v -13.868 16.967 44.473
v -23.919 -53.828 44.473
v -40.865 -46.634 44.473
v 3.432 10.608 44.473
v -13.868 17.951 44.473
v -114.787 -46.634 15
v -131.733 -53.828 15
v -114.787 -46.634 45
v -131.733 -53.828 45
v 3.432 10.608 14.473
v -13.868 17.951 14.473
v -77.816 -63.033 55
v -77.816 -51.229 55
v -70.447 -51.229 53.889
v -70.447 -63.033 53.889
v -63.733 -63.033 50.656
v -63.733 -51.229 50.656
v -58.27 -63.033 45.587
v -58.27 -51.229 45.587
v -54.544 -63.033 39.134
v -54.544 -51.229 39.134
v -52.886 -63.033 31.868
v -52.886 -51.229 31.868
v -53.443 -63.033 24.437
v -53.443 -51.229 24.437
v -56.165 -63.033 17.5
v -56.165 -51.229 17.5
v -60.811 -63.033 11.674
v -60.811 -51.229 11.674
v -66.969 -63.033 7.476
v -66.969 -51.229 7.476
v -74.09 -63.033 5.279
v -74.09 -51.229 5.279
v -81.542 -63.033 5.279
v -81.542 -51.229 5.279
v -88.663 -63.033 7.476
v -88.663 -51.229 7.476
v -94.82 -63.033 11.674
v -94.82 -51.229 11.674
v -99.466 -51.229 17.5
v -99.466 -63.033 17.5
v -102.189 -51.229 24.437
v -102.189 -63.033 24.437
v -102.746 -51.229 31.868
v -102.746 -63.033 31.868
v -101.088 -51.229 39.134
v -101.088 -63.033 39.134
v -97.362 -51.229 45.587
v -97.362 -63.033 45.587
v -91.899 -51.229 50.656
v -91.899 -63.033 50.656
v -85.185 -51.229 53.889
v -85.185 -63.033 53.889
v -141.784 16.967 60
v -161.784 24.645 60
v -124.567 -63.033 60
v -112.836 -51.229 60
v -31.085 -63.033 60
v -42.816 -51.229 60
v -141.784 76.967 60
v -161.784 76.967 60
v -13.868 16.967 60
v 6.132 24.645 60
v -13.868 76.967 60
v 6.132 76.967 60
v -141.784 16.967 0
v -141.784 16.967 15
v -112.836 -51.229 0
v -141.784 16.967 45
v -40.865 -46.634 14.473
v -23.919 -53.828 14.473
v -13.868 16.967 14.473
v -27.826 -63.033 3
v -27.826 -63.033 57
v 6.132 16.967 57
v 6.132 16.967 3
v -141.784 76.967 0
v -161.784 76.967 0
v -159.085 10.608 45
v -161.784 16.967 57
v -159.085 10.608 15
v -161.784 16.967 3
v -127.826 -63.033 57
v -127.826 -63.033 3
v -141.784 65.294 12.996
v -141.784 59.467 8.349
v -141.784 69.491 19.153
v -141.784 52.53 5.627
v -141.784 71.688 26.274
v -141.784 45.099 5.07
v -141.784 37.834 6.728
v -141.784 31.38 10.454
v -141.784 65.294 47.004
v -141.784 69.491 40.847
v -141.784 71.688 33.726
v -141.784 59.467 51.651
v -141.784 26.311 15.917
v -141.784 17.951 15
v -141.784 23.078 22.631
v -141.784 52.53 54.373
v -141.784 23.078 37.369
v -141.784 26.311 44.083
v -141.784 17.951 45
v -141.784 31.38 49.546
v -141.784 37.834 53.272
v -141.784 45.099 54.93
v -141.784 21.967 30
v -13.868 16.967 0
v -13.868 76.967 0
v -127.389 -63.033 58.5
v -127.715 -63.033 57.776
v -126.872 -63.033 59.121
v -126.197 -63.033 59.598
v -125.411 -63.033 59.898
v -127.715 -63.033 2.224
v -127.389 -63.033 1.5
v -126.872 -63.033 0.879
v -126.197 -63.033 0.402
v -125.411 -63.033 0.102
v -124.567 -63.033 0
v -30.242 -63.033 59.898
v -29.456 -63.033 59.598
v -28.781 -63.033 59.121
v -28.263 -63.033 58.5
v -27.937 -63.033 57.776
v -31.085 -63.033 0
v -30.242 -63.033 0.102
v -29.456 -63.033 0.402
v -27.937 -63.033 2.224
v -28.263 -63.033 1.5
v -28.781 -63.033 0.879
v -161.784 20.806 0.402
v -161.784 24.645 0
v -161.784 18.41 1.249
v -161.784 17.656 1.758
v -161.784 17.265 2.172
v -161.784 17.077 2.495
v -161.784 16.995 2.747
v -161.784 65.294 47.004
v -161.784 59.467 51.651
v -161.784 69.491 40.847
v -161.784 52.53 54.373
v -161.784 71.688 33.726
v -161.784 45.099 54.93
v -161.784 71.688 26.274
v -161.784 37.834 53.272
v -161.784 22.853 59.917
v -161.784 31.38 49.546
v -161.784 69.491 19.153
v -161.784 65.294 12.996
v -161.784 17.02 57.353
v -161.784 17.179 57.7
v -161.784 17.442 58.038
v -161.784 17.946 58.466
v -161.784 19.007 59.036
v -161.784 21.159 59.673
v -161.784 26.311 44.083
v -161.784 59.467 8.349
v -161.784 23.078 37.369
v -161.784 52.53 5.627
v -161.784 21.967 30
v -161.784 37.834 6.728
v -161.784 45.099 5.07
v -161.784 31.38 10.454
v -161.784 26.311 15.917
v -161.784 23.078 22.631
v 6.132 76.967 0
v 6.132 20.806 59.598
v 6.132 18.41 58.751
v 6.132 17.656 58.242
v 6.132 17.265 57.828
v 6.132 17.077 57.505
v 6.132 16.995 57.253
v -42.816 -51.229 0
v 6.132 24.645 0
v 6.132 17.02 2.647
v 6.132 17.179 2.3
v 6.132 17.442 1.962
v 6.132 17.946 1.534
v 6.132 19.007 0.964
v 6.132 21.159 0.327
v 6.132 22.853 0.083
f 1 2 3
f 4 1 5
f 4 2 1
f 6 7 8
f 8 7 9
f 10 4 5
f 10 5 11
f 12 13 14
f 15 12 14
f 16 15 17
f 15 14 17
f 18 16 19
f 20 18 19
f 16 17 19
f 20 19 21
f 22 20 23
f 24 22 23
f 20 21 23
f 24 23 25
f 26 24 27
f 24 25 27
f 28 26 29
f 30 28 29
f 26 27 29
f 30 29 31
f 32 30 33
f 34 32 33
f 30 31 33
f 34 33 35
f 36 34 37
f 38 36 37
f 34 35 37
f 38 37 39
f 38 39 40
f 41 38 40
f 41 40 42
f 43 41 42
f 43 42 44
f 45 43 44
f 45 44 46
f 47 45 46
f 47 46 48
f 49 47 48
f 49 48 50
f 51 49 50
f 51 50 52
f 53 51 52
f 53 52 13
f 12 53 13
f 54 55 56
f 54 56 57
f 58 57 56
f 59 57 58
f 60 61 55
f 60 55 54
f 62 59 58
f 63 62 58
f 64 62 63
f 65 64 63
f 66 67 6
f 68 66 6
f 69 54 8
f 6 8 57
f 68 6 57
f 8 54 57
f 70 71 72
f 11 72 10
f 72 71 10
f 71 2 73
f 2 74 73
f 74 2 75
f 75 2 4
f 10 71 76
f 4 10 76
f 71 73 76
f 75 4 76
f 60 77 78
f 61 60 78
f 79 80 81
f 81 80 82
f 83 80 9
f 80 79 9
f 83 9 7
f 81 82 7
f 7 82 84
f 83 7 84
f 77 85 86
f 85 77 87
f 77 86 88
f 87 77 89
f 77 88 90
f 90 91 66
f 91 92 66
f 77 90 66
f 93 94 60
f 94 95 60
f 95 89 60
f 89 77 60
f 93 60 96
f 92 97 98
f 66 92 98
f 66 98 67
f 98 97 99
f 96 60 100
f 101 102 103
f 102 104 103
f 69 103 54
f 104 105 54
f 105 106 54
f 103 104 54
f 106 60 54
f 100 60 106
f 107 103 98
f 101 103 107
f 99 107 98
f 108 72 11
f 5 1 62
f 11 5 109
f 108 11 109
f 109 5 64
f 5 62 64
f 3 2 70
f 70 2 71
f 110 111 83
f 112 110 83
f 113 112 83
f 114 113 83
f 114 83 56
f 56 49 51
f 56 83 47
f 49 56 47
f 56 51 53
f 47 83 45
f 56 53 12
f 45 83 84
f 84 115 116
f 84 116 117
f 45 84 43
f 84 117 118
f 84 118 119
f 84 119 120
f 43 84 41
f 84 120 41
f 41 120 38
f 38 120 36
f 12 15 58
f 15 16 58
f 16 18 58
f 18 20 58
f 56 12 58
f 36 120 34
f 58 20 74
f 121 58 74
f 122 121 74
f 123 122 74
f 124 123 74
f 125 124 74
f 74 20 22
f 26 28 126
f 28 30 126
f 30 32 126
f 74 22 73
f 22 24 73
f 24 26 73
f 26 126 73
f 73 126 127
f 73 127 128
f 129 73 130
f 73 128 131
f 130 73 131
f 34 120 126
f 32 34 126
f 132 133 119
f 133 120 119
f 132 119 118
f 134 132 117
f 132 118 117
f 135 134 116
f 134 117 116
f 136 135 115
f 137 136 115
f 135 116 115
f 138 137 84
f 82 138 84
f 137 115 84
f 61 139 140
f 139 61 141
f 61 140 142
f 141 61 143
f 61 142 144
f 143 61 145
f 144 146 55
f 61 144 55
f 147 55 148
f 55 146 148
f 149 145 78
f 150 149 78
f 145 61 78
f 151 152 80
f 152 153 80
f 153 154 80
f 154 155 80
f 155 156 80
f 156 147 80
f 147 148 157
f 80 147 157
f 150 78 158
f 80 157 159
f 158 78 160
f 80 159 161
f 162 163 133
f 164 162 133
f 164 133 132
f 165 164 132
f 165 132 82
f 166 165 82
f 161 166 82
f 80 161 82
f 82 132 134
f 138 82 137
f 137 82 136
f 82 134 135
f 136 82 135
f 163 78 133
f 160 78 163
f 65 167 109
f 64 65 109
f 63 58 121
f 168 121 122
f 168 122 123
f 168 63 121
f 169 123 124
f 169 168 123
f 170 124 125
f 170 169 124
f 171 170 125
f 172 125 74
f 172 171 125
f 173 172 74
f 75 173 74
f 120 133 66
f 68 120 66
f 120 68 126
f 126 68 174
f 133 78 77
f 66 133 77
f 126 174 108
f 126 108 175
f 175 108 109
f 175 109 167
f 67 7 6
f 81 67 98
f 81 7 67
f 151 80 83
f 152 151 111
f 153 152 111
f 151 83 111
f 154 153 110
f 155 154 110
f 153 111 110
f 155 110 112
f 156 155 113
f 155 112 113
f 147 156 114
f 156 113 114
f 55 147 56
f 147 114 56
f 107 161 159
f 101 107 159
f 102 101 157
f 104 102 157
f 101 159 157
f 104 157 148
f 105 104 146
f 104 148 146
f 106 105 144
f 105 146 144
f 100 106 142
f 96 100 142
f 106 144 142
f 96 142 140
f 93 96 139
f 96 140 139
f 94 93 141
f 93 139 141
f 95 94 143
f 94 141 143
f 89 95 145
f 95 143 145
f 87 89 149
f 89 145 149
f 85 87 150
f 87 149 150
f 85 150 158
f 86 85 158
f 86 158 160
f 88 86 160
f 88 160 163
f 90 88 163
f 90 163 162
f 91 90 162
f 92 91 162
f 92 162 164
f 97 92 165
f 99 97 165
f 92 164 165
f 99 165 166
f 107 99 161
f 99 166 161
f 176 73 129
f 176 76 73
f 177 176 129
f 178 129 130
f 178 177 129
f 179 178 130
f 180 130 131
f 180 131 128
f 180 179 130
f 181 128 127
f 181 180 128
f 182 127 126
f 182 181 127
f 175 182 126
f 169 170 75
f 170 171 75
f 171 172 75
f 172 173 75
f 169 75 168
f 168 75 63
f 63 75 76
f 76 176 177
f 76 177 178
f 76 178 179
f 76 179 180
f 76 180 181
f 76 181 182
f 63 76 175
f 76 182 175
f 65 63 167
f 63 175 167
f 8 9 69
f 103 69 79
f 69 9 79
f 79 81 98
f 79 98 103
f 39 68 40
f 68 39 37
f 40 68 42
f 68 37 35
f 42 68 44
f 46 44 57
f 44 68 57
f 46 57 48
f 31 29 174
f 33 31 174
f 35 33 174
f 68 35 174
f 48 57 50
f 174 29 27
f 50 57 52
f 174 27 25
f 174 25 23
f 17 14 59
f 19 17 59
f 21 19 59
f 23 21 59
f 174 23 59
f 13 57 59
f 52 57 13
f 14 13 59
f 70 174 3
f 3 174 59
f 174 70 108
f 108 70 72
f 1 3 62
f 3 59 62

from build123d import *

# Parameters (mm, degrees)
EXTRUDE_2_DEPTH     = 60
CUT_EXTRUDE_2_DEPTH = 189.939286944
SKETCH_7_R          = 25
CUT_EXTRUDE_4_DEPTH = 20
SKETCH_8_R          = 25
CUT_EXTRUDE_5_DEPTH = 20
SKETCH_9_W          = 30
SKETCH_9_H          = 70
CUT_EXTRUDE_6_DEPTH = 20
SKETCH_10_W         = 30
SKETCH_10_H         = 70
CUT_EXTRUDE_7_DEPTH = 20
FILLET_1_R          = 3
FILLET_2_R          = 3
FILLET_3_R          = 3
FILLET_4_R          = 3


with BuildPart() as part:
    # 草图1 → 凸台-拉伸2 (new body)
    with BuildSketch(Plane.XY):
        Polygon((-161.784091828, 76.967277349), (-161.784091828, 16.967277349), (-127.826106531, -63.032722651), (-27.826106531, -63.032722651), (6.131878766, 16.967277349), (6.131878766, 76.967277349), align=None)
    extrude(amount=EXTRUDE_2_DEPTH)

    # 草图5 → 切除-拉伸2 (cut, through all)
    with BuildSketch(Plane.XY.offset(60)):
        Polygon((-141.784091828, 76.967277349), (-141.784091828, 16.967277349), (-112.836441026, -51.229114277), (-42.815772036, -51.229114277), (-13.868121234, 16.967277349), (-13.868121234, 76.967277349), align=None)
    extrude(amount=-CUT_EXTRUDE_2_DEPTH, mode=Mode.SUBTRACT)

    # 草图7 → 切除-拉伸4 (cut)
    with BuildSketch(Plane.ZY.offset(161.784091828)):
        with Locations(Location((30, 46.967277349, 0), (0, 0, 270))):
            Circle(SKETCH_7_R)
    extrude(amount=-CUT_EXTRUDE_4_DEPTH, mode=Mode.SUBTRACT)

    # 草图8 → 切除-拉伸5 (cut)
    with BuildSketch(Plane(origin=(0, -51.229114277, 0), x_dir=(1, 0, 0), z_dir=(0, 1, 0))):
        with Locations(Location((-77.815772036, -30, 0), (0, 0, 270))):
            Circle(SKETCH_8_R)
    extrude(amount=-CUT_EXTRUDE_5_DEPTH, mode=Mode.SUBTRACT)

    # 草图9 → 切除-拉伸6 (cut)
    with BuildSketch(Plane(origin=(-130.981763761, -55.598460099, 0), x_dir=(0, 0, 1), z_dir=(-0.9205048534524416, -0.3907311284892711, 0))):
        with Locations((30, 36.923711729)):
            Rectangle(SKETCH_9_W, SKETCH_9_H)
    extrude(amount=-CUT_EXTRUDE_6_DEPTH, mode=Mode.SUBTRACT)

    # 草图10 → 切除-拉伸7 (cut)
    with BuildSketch(Plane(origin=(-0.906899112, 0.384955834, 0), x_dir=(0, 0, -1), z_dir=(0.9205048534524416, -0.3907311284892711, 0))):
        with Locations((-29.473403637, -23.894453133)):
            Rectangle(SKETCH_10_W, SKETCH_10_H)
    extrude(amount=-CUT_EXTRUDE_7_DEPTH, mode=Mode.SUBTRACT)

    # 圆角1
    fillet_1_edges = [part.edges().sort_by_distance(p)[0] for p in [
        (-144.805099179, -23.032722651, 0),
    ]]
    fillet(fillet_1_edges, radius=FILLET_1_R)

    # 圆角2
    fillet_2_edges = [part.edges().sort_by_distance(p)[0] for p in [
        (-144.805099179, -23.032722651, 60),
    ]]
    fillet(fillet_2_edges, radius=FILLET_2_R)

    # 圆角3
    fillet_3_edges = [part.edges().sort_by_distance(p)[0] for p in [
        (-10.847113883, -23.032722651, 60),
    ]]
    fillet(fillet_3_edges, radius=FILLET_3_R)

    # 圆角4
    fillet_4_edges = [part.edges().sort_by_distance(p)[0] for p in [
        (-10.847113883, -23.032722651, 0),
    ]]
    fillet(fillet_4_edges, radius=FILLET_4_R)


solid = part.part
